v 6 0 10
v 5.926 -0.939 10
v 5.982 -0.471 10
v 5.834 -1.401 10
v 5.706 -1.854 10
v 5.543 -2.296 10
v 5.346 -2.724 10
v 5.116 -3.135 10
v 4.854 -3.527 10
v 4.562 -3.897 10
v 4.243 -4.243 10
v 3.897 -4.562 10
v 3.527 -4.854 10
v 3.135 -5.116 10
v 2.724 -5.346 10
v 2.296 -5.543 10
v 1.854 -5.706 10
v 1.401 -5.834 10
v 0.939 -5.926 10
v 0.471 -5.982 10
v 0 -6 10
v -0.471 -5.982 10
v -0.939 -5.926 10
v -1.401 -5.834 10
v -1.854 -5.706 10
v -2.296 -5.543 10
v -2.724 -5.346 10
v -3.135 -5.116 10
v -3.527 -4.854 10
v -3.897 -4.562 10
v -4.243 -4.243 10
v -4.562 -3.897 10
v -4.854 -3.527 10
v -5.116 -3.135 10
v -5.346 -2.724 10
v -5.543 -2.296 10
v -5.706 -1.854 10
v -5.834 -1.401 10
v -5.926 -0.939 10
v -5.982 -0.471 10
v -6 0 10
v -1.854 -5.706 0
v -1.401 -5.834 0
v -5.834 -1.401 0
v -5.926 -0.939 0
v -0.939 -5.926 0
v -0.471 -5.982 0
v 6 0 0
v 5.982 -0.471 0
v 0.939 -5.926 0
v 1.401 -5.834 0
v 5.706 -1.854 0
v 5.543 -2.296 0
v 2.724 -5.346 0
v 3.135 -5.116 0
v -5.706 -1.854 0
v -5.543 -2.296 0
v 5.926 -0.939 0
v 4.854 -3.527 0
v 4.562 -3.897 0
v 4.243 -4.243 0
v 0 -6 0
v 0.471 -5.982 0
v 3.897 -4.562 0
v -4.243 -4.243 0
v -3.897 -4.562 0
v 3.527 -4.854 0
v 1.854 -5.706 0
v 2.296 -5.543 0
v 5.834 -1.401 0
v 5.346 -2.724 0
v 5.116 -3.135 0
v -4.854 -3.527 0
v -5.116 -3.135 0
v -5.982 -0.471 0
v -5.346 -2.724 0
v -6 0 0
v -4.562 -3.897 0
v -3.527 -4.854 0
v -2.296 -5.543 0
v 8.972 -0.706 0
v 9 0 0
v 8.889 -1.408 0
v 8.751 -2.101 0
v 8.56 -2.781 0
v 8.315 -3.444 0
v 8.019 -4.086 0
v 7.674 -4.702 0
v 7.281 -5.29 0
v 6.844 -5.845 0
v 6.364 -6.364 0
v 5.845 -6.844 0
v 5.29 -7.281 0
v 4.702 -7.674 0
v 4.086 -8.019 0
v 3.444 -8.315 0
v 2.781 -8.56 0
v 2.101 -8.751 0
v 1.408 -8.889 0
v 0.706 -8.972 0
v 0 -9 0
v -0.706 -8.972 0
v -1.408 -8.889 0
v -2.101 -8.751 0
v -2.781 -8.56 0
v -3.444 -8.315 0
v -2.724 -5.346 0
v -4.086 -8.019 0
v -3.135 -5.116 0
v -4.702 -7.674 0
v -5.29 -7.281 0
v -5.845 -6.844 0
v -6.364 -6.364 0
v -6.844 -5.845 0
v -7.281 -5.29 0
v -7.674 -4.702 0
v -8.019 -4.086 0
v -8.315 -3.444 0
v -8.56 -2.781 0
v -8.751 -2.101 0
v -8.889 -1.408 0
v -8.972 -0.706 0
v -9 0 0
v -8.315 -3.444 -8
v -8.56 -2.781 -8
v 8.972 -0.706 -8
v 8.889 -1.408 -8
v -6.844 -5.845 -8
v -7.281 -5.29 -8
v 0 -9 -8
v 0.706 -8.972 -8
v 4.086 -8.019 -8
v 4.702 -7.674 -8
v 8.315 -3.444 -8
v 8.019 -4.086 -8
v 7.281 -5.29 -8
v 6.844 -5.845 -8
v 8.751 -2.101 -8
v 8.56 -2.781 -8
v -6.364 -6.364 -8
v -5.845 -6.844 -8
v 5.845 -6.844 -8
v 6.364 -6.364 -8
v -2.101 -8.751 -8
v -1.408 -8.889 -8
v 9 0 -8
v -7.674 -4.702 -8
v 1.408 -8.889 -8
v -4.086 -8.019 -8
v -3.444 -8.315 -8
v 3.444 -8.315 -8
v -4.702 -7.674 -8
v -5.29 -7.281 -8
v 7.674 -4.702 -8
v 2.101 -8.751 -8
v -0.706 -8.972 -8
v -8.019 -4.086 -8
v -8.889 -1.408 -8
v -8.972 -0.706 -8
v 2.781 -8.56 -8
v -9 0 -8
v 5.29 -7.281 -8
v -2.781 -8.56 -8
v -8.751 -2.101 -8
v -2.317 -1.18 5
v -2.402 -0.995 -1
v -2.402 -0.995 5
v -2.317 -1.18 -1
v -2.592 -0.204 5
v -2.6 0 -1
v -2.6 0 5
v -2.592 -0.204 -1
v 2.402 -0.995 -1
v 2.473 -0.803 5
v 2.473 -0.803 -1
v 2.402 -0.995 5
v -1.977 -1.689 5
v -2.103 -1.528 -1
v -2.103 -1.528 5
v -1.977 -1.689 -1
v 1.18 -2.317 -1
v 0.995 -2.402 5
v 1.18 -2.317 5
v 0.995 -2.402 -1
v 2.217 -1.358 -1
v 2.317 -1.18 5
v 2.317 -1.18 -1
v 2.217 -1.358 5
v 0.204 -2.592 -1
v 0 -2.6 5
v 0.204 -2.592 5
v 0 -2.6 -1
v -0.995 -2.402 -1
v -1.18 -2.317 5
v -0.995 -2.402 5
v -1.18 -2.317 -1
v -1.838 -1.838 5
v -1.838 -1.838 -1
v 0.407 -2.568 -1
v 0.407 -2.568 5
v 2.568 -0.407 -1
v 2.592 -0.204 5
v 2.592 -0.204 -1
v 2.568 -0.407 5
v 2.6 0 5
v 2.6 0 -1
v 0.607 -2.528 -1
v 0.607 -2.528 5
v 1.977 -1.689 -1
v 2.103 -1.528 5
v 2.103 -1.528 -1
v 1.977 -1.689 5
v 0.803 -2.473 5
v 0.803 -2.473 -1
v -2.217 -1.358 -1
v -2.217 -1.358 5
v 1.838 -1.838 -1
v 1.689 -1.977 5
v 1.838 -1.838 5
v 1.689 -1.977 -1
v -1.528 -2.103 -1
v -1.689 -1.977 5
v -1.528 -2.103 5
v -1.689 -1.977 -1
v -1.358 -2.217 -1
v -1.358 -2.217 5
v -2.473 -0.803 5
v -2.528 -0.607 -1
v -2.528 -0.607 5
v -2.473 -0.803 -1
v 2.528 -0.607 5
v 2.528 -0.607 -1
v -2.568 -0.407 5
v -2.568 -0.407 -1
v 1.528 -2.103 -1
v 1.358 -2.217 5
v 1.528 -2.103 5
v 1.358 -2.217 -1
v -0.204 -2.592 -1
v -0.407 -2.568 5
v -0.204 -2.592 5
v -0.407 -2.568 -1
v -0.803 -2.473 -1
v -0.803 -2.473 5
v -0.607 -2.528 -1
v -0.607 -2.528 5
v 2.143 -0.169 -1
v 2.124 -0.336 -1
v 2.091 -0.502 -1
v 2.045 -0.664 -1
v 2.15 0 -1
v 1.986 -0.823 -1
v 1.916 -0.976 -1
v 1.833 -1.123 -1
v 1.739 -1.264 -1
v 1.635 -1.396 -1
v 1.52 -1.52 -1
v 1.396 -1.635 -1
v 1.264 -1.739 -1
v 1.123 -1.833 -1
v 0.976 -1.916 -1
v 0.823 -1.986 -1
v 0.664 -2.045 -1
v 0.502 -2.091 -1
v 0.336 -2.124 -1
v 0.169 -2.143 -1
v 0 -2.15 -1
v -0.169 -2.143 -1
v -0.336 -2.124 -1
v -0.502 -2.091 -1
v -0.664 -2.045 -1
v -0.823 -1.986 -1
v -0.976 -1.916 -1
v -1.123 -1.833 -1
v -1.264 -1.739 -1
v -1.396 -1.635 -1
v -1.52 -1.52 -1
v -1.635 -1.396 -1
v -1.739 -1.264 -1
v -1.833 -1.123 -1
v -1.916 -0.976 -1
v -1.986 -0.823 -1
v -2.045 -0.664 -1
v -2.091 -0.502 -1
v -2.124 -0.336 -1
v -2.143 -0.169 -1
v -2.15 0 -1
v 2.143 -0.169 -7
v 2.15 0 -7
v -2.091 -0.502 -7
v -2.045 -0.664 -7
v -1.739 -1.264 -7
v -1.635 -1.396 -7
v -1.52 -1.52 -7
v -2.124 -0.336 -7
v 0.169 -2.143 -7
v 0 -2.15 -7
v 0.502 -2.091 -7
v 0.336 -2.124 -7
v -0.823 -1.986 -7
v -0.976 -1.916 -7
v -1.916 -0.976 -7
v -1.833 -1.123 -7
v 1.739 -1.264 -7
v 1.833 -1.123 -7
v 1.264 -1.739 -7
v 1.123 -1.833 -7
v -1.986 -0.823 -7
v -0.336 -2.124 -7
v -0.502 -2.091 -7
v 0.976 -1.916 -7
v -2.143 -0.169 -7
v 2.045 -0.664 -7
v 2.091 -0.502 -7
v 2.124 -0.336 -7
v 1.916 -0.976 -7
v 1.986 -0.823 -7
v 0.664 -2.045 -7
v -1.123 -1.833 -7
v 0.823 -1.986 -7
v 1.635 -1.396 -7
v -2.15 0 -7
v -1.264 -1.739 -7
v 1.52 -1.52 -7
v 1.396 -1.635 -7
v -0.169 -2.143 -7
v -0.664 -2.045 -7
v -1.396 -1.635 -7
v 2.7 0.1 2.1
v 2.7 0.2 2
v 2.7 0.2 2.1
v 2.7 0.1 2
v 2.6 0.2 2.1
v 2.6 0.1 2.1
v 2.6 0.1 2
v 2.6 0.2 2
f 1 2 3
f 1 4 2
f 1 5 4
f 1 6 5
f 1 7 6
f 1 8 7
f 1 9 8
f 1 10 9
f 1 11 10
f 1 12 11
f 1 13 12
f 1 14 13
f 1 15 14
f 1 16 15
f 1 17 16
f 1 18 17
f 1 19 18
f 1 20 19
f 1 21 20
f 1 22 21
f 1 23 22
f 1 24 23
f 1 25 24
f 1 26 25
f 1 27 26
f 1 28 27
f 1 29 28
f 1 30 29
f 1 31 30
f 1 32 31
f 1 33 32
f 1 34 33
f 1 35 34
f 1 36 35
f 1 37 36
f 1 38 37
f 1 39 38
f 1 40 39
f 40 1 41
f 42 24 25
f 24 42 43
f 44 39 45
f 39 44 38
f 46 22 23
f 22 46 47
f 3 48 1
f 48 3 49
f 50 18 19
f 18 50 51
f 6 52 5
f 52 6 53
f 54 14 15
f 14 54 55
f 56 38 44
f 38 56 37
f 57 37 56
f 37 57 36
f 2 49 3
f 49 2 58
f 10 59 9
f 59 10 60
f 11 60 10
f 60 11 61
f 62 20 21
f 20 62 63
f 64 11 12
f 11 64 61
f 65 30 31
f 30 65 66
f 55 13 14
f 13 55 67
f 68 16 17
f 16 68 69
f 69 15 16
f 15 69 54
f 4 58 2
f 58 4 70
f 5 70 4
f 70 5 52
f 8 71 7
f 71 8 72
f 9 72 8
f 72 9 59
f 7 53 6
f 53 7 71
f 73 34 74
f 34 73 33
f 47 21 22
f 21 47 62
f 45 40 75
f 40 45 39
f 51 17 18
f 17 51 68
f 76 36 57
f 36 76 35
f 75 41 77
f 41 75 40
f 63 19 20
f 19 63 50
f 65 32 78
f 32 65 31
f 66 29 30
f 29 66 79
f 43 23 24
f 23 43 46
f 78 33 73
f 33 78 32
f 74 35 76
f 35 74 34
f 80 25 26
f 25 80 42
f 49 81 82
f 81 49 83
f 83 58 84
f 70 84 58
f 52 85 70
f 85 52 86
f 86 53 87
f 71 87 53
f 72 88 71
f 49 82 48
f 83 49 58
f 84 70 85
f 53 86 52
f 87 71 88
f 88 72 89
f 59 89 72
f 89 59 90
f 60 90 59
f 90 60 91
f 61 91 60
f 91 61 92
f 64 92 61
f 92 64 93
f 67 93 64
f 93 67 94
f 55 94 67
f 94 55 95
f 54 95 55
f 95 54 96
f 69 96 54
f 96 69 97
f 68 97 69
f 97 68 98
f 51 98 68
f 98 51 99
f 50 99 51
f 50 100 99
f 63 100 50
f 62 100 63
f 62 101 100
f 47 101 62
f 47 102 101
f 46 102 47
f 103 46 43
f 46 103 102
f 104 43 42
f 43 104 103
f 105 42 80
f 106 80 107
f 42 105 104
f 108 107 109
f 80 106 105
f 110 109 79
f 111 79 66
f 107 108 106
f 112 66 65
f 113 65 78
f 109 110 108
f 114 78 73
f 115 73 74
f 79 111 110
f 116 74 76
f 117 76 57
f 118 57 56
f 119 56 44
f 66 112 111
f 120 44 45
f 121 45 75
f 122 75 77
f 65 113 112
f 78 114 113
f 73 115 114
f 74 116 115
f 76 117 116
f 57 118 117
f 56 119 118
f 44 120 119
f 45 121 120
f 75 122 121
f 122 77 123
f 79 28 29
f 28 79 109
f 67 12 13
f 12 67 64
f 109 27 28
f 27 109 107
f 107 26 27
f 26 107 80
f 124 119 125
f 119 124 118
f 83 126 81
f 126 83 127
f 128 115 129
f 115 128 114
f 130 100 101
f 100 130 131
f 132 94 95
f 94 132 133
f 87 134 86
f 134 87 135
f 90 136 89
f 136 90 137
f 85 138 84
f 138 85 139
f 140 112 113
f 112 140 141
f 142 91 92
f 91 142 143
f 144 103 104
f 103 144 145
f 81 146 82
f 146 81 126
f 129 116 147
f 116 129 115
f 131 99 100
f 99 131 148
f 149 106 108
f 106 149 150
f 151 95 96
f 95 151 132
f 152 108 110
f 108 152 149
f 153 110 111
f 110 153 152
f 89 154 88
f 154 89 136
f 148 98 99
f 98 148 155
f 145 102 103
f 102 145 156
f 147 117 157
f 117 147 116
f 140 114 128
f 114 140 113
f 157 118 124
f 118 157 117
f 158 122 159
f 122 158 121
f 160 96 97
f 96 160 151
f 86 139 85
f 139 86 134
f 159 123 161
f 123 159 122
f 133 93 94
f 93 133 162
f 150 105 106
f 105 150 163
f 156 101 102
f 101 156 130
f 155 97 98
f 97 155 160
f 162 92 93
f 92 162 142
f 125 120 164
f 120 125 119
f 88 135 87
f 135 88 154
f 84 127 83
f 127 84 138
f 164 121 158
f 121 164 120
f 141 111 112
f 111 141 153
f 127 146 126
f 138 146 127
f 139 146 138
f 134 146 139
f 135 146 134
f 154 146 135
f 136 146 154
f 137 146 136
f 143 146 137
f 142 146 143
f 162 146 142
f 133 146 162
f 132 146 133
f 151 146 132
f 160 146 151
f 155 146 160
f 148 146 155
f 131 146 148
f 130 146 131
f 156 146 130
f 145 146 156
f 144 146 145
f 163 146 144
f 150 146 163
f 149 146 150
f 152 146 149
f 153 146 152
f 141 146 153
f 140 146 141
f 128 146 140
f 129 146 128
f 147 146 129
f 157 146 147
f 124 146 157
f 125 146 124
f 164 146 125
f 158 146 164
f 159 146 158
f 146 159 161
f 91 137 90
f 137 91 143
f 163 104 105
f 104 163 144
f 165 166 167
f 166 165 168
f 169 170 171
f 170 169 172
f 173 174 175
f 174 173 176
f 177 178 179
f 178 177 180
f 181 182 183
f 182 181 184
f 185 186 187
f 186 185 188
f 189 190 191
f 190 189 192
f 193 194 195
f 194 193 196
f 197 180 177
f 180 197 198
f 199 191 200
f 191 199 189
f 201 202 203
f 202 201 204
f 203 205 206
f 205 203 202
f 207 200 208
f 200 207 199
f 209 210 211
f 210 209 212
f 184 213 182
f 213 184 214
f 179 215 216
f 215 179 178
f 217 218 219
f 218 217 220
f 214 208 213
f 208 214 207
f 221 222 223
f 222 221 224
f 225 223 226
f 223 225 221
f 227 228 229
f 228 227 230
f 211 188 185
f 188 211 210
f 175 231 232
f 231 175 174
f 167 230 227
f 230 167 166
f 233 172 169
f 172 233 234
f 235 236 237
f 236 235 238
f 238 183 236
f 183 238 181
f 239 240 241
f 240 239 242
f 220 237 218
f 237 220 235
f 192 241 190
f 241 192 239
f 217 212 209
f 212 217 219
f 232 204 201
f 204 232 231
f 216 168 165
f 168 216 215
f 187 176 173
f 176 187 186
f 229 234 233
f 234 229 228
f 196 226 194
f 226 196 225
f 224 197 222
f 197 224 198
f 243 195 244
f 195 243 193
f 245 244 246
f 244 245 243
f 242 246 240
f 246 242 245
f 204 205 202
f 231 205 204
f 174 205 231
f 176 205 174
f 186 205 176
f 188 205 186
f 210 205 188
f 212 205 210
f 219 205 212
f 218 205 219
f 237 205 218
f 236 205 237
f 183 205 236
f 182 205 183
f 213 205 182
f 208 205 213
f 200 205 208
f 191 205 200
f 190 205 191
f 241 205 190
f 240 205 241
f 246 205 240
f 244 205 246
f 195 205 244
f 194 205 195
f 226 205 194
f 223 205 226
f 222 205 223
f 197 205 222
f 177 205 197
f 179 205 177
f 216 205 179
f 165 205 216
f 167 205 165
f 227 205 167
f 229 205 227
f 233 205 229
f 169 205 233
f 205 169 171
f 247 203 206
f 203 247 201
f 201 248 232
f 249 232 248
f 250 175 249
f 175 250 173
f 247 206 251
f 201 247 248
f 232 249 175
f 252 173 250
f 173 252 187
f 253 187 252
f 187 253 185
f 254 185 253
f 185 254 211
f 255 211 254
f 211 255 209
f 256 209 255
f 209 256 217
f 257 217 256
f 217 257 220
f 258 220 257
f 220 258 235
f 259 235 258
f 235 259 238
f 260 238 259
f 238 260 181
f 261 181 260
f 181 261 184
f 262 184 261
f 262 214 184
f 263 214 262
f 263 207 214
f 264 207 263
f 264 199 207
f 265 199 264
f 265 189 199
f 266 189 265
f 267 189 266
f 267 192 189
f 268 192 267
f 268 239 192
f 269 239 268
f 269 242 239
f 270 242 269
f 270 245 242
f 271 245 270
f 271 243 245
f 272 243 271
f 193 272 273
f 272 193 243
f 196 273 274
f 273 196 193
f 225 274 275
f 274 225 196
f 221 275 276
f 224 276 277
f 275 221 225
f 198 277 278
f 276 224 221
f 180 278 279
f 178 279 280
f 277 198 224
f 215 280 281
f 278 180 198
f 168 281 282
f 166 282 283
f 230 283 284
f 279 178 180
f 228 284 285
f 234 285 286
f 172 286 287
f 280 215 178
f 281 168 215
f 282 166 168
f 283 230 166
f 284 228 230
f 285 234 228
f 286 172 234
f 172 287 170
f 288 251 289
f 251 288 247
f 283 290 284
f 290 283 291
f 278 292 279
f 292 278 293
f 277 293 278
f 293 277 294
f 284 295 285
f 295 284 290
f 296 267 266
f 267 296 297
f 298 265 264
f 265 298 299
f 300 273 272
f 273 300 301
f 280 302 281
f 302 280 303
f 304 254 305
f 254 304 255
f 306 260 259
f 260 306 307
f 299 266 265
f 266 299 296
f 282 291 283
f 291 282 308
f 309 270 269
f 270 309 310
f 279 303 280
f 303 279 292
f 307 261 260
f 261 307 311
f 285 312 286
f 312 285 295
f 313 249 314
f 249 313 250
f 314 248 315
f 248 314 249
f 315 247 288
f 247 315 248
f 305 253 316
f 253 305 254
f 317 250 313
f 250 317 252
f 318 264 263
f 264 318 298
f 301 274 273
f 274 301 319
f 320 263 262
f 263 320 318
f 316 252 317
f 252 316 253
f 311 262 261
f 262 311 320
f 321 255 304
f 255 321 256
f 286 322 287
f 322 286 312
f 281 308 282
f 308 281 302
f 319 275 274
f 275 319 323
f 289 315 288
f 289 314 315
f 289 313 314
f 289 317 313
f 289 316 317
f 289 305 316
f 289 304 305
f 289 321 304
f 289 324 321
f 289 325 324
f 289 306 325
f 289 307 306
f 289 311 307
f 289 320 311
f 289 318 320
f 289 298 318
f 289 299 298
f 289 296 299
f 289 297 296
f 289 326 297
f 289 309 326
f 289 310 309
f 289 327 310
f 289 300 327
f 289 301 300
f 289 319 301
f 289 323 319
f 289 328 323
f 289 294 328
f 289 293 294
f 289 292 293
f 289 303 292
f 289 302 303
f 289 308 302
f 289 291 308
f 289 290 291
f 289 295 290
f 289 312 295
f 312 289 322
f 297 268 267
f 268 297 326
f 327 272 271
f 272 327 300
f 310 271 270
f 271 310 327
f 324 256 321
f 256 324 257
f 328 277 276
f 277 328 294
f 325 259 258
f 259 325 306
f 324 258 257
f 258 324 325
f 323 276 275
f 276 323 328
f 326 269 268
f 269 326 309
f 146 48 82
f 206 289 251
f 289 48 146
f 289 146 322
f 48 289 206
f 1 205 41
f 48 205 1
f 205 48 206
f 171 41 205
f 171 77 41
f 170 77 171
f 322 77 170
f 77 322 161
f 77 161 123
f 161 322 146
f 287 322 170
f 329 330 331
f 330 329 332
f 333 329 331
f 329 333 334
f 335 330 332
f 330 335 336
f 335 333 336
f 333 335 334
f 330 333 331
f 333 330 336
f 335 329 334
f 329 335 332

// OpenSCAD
// Cross-section detail of one stepped screw hole in the base
$fn = 80;

// Show as if looking at the screw axis vertically.
// Boss: cylinder d=12, h=10. Hole: d=5.2 x 6 deep, then d=4.3 x 6 deep below it.
difference() {
    union() {
        // boss
        cylinder(h=10, d=12);
        // some surrounding material below to show full hole
        translate([0,0,-8]) cylinder(h=8, d=18);
    }
    // upper section: d=5.2, 6 deep, starting 5mm from top (matches "translate -5, h=6")
    translate([0,0,-1]) cylinder(h=6, d=5.2);
    // lower section: d=4.3, 6 deep, starting 11mm below top
    translate([0,0,-7]) cylinder(h=6, d=4.3);
    // Cut away front half to expose cross-section
    translate([-50,0,-20]) cube([100,50,40]);
}

// Dimension labels as thin colored markers
color([1,0,0]) translate([2.6,0.1,2]) cube([0.1,0.1,0.1]); // marker
